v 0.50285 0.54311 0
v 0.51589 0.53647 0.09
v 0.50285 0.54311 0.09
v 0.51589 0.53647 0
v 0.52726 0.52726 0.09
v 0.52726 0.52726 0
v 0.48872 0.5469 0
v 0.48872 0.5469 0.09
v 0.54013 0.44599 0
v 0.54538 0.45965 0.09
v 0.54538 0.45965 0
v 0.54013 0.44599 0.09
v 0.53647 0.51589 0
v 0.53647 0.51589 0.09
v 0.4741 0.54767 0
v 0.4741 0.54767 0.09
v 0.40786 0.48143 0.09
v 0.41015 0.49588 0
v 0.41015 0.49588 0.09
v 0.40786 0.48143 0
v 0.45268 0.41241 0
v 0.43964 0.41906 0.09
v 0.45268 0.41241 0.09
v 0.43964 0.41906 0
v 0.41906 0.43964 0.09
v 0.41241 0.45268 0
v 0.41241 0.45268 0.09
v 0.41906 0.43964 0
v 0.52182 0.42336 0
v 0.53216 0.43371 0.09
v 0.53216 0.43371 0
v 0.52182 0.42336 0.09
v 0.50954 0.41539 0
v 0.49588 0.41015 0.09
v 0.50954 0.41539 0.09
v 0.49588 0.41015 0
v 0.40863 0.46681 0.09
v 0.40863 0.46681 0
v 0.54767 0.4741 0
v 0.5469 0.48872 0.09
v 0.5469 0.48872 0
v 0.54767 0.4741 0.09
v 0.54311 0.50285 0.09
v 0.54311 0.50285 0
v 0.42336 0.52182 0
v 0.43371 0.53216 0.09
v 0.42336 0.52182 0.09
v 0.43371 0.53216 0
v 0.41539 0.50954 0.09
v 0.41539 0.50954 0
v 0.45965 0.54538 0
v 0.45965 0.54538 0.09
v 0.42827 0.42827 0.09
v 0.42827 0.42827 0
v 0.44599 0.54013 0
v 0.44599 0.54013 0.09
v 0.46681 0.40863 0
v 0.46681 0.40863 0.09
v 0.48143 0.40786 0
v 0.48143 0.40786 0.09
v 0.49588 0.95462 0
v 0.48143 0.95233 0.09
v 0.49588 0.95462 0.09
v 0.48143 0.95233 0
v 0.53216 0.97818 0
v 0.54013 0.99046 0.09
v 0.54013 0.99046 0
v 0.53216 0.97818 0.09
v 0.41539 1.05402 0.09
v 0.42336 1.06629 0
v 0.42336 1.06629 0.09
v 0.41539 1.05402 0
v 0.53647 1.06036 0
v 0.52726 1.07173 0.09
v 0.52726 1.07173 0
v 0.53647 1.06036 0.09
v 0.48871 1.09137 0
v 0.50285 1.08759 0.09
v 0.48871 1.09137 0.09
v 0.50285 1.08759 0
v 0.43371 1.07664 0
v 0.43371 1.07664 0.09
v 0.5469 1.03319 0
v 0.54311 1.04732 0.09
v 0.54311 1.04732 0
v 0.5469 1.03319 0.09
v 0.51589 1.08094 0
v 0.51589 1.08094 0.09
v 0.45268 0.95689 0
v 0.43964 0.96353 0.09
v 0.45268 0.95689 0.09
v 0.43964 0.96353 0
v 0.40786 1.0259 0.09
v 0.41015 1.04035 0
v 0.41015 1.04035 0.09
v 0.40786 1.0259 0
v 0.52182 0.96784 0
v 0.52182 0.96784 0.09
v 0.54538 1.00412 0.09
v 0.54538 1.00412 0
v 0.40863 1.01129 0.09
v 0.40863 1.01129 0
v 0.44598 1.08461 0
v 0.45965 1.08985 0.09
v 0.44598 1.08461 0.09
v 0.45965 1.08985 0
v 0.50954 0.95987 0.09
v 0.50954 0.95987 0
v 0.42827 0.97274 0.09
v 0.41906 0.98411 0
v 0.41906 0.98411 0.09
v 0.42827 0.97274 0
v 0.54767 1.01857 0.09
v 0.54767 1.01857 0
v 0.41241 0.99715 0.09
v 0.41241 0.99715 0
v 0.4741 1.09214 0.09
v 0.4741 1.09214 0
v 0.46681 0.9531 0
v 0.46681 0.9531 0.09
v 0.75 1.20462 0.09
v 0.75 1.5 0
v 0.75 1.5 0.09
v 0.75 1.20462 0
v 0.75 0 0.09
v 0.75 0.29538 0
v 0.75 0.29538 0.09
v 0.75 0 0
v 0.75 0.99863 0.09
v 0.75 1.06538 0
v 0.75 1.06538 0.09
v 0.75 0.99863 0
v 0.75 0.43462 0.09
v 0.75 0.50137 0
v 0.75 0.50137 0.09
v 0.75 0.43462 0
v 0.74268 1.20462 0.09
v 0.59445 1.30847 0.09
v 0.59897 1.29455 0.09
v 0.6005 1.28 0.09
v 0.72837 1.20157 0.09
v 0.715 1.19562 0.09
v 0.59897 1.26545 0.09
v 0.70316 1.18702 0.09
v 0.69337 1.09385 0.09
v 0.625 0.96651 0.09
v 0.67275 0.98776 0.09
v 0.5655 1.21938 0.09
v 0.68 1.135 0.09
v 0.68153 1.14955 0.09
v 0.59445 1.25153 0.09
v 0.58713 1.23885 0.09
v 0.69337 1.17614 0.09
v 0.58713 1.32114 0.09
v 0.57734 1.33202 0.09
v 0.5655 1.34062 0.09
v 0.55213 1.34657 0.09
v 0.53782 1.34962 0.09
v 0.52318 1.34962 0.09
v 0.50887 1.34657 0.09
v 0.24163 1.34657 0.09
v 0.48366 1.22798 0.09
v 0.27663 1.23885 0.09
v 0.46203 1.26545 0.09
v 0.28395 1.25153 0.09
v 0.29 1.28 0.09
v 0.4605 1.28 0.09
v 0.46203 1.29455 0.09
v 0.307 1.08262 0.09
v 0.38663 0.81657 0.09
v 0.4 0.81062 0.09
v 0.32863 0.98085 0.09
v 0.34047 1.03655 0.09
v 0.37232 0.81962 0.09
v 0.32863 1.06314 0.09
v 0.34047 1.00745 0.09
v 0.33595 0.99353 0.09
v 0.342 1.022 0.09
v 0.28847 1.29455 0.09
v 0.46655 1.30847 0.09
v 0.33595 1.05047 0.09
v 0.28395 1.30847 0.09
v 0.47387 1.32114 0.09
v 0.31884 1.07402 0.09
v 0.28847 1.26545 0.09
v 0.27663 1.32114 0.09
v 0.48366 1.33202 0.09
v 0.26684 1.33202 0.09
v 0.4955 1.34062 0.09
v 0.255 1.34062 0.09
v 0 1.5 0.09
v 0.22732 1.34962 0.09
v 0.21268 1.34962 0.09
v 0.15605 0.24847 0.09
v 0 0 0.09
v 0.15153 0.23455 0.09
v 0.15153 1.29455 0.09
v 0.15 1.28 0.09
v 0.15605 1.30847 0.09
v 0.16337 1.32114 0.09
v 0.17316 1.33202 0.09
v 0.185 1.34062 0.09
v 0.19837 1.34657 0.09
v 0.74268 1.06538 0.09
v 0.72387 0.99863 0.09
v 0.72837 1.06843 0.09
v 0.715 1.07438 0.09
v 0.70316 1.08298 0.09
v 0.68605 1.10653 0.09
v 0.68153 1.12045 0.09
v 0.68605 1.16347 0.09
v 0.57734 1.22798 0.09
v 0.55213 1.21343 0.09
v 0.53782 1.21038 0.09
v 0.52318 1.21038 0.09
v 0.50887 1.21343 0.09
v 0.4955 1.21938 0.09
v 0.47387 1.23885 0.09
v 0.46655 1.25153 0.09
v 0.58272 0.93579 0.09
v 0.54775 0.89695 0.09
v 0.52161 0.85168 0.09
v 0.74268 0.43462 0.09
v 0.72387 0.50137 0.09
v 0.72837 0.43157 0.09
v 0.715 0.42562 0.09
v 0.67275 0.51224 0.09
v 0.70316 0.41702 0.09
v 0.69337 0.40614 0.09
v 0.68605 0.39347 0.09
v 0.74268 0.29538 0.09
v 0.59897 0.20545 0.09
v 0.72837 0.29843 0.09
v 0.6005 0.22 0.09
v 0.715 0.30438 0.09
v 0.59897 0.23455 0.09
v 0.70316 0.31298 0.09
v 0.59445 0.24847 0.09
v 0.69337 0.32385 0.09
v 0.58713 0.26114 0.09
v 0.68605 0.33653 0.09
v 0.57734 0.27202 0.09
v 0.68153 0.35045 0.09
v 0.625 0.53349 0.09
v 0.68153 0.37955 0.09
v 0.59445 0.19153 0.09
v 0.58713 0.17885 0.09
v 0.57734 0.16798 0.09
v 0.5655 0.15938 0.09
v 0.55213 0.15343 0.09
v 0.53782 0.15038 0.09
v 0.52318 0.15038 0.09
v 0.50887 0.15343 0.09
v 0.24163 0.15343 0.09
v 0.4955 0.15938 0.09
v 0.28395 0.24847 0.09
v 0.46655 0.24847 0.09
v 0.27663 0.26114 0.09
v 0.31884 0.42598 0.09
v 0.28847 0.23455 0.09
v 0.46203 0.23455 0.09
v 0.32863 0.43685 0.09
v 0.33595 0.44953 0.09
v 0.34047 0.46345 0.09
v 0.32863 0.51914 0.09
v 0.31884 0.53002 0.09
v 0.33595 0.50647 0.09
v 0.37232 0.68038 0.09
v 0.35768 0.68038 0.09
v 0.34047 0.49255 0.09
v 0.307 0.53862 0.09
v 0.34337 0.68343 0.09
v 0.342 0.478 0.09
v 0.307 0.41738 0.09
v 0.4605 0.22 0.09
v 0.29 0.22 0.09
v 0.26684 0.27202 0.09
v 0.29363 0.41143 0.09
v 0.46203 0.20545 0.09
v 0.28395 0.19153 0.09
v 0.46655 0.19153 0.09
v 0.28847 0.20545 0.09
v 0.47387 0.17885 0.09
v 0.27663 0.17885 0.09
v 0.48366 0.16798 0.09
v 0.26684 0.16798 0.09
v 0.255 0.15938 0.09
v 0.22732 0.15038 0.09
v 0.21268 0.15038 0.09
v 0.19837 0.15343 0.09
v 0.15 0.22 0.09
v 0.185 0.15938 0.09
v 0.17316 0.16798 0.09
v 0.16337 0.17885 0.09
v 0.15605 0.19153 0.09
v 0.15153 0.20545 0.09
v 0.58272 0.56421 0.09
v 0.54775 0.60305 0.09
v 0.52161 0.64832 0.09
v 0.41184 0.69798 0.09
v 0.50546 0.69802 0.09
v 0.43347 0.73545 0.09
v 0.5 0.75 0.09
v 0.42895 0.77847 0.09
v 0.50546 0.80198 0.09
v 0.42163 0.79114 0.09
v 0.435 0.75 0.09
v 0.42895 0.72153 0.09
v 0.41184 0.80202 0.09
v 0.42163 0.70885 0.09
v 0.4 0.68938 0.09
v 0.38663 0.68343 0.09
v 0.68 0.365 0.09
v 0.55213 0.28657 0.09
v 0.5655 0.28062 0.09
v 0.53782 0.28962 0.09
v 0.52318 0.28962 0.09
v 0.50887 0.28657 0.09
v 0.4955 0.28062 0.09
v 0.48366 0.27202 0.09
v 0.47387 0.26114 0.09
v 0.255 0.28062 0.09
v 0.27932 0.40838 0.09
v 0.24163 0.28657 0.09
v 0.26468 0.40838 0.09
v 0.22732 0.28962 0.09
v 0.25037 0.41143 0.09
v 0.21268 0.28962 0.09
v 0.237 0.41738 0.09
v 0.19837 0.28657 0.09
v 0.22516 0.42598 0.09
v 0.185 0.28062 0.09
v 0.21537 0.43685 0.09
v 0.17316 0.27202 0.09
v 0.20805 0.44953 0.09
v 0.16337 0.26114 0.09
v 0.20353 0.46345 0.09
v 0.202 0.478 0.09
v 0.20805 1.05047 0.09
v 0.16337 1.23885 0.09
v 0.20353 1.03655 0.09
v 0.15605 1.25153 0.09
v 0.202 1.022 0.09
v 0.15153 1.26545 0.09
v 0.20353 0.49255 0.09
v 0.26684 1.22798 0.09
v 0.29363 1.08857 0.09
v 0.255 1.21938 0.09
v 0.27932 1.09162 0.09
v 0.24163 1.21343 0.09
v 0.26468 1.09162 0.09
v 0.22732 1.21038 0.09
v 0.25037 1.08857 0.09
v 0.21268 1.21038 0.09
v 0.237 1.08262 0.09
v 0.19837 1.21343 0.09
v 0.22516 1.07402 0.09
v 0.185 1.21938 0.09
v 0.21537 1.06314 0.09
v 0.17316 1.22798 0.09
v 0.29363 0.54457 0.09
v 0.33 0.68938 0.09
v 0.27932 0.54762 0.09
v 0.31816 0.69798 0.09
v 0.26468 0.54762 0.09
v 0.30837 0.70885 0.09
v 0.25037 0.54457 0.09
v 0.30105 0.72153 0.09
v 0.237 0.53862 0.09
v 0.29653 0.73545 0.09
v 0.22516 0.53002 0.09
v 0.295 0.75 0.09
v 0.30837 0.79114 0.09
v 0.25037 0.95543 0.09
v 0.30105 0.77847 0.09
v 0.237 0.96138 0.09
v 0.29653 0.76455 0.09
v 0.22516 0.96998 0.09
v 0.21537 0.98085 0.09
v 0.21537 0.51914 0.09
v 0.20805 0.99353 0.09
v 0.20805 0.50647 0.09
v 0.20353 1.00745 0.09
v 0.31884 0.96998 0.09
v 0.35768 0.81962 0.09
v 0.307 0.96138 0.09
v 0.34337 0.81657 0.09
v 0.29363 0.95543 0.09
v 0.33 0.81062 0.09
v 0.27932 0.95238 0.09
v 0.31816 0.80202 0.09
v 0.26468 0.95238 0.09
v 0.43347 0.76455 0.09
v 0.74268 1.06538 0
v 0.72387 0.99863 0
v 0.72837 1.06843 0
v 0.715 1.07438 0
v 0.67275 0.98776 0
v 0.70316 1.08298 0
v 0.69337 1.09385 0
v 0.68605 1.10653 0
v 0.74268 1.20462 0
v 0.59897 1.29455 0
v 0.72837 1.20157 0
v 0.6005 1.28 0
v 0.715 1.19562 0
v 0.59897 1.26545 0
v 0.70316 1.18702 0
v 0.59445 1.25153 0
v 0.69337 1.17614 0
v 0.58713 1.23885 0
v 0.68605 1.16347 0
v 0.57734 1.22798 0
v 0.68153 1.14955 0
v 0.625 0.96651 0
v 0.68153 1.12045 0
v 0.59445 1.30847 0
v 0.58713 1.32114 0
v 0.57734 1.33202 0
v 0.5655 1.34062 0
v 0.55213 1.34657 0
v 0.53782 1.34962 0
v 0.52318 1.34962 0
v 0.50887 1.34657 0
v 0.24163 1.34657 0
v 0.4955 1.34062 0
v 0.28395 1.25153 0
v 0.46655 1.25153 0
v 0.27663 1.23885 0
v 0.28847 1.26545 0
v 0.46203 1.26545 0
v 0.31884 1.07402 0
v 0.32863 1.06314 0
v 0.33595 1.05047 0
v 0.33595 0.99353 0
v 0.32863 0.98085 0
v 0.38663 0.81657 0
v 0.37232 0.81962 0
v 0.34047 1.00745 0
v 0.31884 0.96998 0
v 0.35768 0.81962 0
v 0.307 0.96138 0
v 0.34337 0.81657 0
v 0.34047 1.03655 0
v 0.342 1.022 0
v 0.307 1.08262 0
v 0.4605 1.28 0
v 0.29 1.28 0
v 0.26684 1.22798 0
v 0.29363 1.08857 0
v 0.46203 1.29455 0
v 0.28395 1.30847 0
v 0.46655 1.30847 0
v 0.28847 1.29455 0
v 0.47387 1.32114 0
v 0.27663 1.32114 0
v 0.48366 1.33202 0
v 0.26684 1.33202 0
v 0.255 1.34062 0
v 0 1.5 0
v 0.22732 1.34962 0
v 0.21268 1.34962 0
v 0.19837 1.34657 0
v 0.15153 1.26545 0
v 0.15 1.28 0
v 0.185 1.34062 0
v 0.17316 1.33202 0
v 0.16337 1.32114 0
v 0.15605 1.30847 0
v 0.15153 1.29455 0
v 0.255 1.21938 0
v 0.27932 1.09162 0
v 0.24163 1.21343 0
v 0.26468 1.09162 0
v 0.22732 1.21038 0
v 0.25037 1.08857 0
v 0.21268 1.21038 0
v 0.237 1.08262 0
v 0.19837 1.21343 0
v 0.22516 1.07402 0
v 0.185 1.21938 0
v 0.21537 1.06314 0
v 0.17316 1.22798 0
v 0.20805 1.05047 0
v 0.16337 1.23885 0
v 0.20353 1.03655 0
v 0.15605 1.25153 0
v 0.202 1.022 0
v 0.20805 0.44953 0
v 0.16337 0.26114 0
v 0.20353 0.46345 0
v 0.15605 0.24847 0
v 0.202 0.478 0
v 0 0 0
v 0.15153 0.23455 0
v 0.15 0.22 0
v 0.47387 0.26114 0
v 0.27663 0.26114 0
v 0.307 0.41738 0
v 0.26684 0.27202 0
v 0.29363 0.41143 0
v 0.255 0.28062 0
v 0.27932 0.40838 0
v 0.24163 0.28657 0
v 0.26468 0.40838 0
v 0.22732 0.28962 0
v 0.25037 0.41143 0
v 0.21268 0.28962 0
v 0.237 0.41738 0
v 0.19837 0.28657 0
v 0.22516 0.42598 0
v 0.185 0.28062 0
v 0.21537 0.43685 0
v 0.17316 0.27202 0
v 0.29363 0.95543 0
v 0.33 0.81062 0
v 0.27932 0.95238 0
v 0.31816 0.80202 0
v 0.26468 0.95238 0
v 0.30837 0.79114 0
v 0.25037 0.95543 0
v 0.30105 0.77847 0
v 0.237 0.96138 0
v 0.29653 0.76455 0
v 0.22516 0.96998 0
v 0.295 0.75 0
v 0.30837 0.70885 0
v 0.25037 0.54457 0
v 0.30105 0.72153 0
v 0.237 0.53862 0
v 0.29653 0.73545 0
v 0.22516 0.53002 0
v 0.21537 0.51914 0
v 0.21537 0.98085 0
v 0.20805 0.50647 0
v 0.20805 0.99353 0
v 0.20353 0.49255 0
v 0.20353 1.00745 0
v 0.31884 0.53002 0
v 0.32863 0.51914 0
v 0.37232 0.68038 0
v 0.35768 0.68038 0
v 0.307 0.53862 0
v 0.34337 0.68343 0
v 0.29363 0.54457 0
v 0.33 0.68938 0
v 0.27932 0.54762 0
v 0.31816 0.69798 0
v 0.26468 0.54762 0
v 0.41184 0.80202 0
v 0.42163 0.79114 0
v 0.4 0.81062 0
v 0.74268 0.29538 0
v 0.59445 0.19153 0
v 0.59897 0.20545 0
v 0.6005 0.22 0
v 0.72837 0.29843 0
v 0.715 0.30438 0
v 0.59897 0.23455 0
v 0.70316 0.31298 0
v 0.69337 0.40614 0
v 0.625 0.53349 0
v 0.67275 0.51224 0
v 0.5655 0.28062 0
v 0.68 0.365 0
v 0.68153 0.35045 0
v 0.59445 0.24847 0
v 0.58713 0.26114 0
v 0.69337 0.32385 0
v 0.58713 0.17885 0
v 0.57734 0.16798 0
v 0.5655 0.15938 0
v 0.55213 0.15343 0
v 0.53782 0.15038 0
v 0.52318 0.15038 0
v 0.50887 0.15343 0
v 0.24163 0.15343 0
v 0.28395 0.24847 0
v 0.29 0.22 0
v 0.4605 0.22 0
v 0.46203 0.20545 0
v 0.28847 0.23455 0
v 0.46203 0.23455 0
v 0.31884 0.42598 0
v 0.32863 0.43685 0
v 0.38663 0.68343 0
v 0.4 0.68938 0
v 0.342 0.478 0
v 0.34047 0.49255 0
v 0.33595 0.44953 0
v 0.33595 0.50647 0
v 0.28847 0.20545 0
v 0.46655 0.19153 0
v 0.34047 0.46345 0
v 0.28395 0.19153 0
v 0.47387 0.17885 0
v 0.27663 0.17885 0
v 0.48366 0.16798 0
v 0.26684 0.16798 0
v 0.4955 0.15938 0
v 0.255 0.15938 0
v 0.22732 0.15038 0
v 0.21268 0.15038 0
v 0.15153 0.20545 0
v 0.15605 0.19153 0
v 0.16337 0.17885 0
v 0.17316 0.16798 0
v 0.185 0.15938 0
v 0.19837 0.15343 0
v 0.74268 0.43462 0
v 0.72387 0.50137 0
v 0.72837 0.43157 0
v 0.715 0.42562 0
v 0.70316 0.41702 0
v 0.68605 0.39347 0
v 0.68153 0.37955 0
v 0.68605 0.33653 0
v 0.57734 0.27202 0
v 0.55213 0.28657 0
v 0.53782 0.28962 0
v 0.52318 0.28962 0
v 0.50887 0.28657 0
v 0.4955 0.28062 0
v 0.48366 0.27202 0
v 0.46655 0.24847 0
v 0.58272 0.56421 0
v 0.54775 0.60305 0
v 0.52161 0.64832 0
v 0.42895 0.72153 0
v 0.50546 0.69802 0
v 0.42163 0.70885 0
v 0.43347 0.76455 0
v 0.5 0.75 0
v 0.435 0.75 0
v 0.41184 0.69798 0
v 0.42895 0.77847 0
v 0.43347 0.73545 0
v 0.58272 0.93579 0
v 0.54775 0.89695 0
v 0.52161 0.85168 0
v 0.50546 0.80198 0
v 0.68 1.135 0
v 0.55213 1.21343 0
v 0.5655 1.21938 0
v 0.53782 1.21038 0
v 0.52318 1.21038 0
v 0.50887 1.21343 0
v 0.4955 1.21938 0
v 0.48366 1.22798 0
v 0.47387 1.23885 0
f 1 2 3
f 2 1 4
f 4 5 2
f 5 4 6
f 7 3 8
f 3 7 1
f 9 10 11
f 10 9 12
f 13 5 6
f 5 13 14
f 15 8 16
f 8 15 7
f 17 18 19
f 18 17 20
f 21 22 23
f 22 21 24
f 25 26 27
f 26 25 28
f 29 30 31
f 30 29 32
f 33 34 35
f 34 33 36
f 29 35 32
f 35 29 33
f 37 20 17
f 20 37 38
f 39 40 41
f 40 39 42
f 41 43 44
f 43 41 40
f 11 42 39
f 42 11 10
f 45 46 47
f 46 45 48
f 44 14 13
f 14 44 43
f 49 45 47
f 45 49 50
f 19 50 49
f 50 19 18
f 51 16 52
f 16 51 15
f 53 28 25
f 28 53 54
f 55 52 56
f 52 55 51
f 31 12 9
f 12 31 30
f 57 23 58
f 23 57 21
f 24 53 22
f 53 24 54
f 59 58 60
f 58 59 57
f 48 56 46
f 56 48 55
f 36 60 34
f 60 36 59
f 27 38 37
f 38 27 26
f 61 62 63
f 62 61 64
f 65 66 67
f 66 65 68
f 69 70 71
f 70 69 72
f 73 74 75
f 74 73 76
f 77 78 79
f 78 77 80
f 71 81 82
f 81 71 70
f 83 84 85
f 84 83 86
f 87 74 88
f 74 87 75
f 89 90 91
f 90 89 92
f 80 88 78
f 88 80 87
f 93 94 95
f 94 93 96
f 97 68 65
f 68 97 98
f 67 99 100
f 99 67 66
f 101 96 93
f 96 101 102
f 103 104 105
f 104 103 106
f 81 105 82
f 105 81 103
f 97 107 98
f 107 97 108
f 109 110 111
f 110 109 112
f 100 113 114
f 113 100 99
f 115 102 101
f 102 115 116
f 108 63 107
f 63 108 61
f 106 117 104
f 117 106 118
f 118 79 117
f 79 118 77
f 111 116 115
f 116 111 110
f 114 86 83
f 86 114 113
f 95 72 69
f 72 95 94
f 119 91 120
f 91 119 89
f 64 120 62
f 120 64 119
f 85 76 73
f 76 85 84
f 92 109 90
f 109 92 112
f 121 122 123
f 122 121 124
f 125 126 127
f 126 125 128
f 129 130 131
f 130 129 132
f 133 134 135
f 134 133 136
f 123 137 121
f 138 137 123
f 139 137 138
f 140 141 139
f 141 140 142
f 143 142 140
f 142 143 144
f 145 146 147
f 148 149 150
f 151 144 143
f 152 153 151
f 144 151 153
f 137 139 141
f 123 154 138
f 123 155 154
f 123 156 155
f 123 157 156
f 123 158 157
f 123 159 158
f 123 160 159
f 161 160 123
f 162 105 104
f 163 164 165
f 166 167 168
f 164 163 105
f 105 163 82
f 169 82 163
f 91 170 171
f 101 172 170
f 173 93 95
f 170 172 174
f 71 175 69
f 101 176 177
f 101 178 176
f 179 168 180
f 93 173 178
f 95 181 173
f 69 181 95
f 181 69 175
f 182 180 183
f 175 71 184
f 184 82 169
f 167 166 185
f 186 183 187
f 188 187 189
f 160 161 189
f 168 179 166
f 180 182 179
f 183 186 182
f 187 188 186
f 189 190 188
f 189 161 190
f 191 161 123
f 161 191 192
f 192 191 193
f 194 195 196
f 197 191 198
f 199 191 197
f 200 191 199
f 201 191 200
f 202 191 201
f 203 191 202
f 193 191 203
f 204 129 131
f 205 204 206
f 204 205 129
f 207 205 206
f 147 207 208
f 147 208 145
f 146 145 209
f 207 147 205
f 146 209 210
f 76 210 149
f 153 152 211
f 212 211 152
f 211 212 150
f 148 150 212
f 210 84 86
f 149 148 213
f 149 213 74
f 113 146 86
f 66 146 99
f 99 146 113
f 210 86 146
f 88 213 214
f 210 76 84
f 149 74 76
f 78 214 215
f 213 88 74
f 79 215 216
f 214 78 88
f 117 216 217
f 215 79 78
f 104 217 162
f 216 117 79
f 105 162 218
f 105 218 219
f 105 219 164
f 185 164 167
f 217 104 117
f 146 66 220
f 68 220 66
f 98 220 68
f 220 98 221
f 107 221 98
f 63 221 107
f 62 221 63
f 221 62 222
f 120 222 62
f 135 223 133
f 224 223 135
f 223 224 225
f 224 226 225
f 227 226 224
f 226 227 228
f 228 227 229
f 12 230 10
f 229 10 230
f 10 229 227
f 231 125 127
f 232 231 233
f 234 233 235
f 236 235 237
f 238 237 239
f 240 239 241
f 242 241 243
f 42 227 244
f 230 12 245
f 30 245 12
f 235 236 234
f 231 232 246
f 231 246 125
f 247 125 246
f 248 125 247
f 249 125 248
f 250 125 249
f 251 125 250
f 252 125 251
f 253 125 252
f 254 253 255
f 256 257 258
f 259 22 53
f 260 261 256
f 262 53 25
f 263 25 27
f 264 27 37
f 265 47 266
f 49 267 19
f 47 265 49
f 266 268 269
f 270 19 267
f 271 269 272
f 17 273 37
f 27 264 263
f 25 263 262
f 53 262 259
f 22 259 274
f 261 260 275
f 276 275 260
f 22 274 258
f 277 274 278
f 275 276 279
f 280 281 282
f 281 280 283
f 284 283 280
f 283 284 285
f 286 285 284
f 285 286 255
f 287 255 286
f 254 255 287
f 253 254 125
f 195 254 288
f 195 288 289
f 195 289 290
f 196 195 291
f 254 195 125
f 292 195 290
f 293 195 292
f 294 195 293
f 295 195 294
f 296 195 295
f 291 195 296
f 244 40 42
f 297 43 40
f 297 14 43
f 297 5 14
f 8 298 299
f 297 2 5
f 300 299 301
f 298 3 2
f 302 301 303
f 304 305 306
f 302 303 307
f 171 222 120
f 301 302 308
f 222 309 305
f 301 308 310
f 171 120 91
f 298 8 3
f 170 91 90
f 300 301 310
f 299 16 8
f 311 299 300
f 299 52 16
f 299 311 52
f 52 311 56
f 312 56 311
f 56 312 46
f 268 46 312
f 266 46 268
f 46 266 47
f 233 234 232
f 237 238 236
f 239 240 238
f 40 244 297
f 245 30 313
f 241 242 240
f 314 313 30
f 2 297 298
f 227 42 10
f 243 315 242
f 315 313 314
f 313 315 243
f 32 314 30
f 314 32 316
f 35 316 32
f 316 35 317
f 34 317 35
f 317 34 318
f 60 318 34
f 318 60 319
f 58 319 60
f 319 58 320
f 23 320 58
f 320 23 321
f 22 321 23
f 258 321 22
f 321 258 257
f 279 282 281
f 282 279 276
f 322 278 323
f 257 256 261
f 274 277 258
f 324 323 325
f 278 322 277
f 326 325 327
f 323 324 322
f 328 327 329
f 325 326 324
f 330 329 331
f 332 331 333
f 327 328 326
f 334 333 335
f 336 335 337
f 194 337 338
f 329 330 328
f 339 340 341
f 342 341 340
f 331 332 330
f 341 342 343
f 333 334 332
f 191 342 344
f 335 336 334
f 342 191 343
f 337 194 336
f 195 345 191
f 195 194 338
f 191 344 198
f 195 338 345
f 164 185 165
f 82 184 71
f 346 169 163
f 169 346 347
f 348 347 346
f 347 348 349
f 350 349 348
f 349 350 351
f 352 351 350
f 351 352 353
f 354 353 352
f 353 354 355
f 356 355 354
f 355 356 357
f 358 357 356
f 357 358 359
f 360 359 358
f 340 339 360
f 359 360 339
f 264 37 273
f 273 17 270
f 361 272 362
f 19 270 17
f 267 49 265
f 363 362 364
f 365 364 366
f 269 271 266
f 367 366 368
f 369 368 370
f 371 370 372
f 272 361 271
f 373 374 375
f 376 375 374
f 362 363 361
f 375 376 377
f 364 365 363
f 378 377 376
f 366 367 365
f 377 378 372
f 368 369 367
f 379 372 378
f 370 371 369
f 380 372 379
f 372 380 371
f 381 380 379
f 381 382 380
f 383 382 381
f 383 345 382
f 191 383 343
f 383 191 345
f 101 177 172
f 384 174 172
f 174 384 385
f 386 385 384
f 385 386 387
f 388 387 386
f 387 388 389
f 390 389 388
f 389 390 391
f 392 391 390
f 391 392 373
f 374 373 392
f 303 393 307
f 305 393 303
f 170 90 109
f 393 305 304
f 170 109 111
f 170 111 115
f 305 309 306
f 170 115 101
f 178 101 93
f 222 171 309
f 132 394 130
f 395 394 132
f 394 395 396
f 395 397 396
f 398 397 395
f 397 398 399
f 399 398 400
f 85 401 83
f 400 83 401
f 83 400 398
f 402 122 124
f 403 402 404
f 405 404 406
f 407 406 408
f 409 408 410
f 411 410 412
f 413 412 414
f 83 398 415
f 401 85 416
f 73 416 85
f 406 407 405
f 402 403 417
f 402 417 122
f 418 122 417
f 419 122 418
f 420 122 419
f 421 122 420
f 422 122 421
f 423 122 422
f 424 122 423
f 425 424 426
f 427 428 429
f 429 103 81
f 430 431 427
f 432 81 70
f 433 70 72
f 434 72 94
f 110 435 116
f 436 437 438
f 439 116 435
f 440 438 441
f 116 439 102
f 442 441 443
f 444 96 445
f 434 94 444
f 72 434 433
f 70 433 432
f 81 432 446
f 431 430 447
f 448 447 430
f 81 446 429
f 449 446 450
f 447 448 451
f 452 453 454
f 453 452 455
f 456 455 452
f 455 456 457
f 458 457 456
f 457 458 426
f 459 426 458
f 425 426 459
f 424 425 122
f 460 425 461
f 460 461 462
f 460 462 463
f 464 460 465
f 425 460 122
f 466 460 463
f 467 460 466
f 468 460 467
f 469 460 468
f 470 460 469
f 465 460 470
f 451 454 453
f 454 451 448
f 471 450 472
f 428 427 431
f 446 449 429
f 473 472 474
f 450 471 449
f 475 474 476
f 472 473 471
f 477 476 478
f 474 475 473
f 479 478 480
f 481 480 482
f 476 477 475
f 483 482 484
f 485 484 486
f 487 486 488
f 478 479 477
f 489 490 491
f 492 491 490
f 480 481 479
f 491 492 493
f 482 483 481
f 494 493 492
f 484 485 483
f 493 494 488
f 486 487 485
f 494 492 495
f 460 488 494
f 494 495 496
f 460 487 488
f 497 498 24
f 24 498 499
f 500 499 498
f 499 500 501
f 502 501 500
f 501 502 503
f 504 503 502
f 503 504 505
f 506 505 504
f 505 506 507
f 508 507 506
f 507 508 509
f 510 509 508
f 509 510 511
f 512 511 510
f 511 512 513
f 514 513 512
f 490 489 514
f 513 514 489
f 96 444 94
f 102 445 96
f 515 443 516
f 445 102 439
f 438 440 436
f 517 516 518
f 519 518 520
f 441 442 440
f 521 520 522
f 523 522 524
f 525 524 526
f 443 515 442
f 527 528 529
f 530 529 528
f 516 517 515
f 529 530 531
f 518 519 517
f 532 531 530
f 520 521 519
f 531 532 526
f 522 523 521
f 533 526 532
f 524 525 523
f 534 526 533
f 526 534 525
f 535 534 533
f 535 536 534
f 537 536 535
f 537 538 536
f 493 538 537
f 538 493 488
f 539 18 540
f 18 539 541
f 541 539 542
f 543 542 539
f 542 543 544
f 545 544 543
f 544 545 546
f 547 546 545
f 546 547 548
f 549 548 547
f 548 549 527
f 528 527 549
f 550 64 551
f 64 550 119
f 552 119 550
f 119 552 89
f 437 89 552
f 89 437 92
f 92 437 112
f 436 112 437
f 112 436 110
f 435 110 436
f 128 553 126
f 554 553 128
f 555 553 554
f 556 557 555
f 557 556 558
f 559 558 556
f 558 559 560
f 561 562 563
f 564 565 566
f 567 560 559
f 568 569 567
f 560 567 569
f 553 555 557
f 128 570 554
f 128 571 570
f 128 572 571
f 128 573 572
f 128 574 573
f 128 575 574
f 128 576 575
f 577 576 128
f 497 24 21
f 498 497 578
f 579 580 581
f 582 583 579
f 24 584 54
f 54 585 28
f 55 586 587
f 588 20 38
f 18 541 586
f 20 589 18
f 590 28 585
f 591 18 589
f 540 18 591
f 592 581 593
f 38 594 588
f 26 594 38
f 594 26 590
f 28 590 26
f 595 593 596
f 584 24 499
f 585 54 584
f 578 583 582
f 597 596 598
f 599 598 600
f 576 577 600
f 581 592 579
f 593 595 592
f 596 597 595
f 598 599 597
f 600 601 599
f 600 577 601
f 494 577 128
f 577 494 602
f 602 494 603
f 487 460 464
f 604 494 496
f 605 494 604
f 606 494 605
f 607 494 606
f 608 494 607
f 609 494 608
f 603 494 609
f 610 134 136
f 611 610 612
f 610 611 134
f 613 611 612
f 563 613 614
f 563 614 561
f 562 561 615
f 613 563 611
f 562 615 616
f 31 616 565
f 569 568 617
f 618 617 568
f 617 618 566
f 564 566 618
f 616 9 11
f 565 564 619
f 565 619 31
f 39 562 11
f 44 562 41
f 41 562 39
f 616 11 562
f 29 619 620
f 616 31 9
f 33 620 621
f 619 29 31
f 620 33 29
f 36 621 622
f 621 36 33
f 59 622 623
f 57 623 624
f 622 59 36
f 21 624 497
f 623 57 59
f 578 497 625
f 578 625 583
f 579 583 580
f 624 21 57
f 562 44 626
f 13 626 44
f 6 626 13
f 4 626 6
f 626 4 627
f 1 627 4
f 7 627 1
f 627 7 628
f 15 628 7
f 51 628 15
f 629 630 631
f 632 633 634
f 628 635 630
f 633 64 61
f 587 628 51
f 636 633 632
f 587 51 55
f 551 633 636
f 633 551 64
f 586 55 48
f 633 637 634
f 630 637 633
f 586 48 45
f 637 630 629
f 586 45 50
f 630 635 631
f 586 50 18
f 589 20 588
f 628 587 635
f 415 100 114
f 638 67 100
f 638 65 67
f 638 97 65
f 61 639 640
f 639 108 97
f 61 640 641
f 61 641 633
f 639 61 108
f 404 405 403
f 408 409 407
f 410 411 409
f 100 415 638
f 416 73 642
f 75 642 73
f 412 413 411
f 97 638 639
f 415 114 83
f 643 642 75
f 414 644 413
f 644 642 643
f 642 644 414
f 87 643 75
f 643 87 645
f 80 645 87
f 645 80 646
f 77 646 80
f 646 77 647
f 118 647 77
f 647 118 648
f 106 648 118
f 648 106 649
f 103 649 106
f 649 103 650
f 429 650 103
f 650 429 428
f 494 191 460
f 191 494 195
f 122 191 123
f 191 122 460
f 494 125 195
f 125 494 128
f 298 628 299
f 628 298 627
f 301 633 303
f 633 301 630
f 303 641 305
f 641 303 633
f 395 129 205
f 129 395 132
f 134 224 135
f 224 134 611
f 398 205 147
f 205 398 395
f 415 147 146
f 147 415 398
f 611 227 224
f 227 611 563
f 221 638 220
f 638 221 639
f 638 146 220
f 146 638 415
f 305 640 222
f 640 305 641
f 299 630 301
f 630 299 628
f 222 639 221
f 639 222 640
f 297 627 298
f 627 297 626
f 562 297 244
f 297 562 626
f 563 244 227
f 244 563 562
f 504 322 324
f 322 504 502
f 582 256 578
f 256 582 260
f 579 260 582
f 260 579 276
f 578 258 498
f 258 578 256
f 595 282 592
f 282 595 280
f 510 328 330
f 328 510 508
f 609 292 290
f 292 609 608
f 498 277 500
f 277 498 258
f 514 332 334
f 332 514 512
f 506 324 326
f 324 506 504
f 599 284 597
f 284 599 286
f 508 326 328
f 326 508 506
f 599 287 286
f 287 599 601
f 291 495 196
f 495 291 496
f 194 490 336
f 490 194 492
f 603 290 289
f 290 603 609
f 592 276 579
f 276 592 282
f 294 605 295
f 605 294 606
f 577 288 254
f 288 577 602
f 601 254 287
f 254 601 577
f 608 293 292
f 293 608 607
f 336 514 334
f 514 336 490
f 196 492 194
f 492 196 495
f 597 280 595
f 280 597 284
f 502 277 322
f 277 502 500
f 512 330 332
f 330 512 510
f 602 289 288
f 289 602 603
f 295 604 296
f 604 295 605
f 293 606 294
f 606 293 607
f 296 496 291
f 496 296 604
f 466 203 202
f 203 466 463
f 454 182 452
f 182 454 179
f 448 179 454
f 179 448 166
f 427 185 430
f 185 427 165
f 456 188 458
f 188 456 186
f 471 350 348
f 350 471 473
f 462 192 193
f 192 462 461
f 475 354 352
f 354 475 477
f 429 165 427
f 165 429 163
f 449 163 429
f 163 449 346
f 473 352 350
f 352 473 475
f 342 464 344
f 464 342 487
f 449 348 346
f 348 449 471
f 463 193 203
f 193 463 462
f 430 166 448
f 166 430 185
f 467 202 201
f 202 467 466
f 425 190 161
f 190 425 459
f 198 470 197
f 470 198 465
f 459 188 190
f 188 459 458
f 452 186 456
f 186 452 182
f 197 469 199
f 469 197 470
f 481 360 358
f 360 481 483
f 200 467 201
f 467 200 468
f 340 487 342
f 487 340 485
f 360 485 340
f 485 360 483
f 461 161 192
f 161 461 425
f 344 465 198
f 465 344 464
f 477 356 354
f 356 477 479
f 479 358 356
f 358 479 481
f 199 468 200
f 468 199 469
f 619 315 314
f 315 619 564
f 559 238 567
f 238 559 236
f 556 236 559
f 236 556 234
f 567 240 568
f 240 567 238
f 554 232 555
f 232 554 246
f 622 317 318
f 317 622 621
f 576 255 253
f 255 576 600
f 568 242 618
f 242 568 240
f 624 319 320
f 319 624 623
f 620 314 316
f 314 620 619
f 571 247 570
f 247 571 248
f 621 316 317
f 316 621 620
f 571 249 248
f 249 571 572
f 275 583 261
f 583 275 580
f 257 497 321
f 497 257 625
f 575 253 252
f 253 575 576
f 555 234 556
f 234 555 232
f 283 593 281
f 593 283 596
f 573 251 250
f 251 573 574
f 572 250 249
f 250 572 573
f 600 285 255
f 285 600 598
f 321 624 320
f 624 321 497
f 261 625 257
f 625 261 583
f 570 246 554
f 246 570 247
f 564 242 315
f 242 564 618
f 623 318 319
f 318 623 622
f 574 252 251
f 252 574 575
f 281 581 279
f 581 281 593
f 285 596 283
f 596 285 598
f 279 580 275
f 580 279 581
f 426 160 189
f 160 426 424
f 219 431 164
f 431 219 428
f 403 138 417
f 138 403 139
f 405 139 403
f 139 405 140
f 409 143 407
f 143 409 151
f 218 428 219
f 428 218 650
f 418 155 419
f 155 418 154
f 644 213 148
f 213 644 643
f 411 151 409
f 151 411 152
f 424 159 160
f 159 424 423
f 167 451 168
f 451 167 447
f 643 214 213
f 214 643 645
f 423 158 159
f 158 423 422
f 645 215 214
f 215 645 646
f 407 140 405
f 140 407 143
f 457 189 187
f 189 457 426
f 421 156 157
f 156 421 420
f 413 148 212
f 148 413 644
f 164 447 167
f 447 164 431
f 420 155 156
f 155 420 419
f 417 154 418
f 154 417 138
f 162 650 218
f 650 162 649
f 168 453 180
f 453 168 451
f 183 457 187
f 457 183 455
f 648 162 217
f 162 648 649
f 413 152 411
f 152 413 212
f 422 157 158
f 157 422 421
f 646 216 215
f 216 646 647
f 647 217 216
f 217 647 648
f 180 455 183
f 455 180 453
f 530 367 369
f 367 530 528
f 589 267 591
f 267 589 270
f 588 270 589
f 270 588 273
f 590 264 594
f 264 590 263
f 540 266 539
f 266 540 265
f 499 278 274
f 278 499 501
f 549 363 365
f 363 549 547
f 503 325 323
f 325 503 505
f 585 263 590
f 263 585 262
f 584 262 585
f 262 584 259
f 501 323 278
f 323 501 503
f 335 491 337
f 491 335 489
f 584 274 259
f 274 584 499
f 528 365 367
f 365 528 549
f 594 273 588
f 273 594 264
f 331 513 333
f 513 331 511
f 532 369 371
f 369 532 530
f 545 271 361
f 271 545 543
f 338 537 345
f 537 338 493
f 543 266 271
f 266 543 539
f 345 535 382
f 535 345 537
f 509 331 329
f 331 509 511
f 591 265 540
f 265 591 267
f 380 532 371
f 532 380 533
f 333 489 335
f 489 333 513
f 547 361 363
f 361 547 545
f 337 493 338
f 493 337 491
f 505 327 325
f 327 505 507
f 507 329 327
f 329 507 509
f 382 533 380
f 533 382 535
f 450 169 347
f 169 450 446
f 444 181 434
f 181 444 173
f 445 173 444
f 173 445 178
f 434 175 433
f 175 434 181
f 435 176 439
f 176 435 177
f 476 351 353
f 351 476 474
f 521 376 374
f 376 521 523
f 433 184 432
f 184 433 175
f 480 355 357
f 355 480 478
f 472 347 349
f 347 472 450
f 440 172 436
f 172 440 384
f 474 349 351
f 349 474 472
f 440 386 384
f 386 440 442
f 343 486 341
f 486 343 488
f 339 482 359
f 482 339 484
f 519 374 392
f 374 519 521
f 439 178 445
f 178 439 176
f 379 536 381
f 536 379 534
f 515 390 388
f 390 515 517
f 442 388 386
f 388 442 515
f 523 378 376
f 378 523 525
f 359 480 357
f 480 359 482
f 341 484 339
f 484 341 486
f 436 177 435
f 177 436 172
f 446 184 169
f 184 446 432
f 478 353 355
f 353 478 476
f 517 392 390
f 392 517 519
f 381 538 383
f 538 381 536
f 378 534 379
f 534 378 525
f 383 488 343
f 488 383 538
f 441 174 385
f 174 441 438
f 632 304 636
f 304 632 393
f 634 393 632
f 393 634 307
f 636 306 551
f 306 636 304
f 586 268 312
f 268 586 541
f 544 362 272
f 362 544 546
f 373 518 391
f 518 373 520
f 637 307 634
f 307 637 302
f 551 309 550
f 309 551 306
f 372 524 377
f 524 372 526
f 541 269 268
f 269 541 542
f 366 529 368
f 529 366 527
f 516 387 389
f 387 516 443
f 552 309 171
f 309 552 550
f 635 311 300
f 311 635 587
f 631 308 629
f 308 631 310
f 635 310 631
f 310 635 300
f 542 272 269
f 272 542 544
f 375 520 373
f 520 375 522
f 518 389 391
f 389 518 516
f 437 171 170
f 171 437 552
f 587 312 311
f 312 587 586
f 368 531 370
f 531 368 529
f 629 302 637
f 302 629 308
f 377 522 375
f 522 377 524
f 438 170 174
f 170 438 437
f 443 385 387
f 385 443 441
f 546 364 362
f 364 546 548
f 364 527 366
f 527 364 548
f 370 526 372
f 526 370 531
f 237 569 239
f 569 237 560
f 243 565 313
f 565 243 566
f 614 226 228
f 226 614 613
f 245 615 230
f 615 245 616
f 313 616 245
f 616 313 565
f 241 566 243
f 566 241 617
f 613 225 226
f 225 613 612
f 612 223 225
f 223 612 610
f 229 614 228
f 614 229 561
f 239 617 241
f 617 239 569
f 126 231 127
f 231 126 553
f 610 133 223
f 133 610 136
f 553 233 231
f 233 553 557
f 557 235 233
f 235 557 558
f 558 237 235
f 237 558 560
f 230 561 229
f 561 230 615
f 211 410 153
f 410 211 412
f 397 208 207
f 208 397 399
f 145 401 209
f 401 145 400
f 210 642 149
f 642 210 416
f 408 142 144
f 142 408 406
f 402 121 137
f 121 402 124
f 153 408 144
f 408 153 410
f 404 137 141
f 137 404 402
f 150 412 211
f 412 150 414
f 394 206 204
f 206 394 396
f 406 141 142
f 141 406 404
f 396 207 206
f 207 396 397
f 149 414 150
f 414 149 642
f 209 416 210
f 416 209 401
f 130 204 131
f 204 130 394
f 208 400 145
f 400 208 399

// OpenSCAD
/*
 * This is the side face of a channel.
 */
module channel_half_side() {
   face_depth=0.09;
   hole_extension=0.1;
   hole_height=face_depth+2*hole_extension;
   difference() {
      // the face
      cube(size=[0.75,1.5,face_depth]);
      // the central hole
      translate([0.75,0.75,-hole_extension]) cylinder(h=hole_height, r=0.25);
      // the outer-most holes - the 1.5 hub holes
      translate([0.22,0.22,-hole_extension]) cylinder(h=hole_height, r=0.07);
      translate([0.22,1.5-0.22,-hole_extension]) cylinder(h=hole_height, r=0.07);
      // more holes
      translate([0.75-0.439/2,0.22,-hole_extension]) cylinder(h=hole_height, r=0.07);
      translate([0.75-0.439/2,1.5-0.22,-hole_extension]) cylinder(h=hole_height, r=0.07);
      // more holes
      translate([0.75-0.956/2,0.75-0.544/2,-hole_extension]) cylinder(h=hole_height, r=0.07);
      translate([0.75-0.956/2,0.75+0.544/2,-hole_extension]) cylinder(h=hole_height, r=0.07);
      // more holes - the 0.77 hub holes
      translate([0.75-0.77/2,0.75,-hole_extension]) cylinder(h=hole_height, r=0.07);
      translate([0.75,0.75-0.77/2,-hole_extension]) cylinder(h=hole_height, r=0.07);
      translate([0.75,0.75+0.77/2,-hole_extension]) cylinder(h=hole_height, r=0.07);
      // more holes - the 0.77 hub holes
      translate([0.75,0.75,0])
         rotate(a=45, v=[0,0,1]) {
            translate([-0.77/2,0,-hole_extension]) cylinder(h=hole_height, r=0.07);
            translate([0,0.77/2,-hole_extension]) cylinder(h=hole_height, r=0.07);
         }
   }
}
$fs=0.01;
channel_half_side();
